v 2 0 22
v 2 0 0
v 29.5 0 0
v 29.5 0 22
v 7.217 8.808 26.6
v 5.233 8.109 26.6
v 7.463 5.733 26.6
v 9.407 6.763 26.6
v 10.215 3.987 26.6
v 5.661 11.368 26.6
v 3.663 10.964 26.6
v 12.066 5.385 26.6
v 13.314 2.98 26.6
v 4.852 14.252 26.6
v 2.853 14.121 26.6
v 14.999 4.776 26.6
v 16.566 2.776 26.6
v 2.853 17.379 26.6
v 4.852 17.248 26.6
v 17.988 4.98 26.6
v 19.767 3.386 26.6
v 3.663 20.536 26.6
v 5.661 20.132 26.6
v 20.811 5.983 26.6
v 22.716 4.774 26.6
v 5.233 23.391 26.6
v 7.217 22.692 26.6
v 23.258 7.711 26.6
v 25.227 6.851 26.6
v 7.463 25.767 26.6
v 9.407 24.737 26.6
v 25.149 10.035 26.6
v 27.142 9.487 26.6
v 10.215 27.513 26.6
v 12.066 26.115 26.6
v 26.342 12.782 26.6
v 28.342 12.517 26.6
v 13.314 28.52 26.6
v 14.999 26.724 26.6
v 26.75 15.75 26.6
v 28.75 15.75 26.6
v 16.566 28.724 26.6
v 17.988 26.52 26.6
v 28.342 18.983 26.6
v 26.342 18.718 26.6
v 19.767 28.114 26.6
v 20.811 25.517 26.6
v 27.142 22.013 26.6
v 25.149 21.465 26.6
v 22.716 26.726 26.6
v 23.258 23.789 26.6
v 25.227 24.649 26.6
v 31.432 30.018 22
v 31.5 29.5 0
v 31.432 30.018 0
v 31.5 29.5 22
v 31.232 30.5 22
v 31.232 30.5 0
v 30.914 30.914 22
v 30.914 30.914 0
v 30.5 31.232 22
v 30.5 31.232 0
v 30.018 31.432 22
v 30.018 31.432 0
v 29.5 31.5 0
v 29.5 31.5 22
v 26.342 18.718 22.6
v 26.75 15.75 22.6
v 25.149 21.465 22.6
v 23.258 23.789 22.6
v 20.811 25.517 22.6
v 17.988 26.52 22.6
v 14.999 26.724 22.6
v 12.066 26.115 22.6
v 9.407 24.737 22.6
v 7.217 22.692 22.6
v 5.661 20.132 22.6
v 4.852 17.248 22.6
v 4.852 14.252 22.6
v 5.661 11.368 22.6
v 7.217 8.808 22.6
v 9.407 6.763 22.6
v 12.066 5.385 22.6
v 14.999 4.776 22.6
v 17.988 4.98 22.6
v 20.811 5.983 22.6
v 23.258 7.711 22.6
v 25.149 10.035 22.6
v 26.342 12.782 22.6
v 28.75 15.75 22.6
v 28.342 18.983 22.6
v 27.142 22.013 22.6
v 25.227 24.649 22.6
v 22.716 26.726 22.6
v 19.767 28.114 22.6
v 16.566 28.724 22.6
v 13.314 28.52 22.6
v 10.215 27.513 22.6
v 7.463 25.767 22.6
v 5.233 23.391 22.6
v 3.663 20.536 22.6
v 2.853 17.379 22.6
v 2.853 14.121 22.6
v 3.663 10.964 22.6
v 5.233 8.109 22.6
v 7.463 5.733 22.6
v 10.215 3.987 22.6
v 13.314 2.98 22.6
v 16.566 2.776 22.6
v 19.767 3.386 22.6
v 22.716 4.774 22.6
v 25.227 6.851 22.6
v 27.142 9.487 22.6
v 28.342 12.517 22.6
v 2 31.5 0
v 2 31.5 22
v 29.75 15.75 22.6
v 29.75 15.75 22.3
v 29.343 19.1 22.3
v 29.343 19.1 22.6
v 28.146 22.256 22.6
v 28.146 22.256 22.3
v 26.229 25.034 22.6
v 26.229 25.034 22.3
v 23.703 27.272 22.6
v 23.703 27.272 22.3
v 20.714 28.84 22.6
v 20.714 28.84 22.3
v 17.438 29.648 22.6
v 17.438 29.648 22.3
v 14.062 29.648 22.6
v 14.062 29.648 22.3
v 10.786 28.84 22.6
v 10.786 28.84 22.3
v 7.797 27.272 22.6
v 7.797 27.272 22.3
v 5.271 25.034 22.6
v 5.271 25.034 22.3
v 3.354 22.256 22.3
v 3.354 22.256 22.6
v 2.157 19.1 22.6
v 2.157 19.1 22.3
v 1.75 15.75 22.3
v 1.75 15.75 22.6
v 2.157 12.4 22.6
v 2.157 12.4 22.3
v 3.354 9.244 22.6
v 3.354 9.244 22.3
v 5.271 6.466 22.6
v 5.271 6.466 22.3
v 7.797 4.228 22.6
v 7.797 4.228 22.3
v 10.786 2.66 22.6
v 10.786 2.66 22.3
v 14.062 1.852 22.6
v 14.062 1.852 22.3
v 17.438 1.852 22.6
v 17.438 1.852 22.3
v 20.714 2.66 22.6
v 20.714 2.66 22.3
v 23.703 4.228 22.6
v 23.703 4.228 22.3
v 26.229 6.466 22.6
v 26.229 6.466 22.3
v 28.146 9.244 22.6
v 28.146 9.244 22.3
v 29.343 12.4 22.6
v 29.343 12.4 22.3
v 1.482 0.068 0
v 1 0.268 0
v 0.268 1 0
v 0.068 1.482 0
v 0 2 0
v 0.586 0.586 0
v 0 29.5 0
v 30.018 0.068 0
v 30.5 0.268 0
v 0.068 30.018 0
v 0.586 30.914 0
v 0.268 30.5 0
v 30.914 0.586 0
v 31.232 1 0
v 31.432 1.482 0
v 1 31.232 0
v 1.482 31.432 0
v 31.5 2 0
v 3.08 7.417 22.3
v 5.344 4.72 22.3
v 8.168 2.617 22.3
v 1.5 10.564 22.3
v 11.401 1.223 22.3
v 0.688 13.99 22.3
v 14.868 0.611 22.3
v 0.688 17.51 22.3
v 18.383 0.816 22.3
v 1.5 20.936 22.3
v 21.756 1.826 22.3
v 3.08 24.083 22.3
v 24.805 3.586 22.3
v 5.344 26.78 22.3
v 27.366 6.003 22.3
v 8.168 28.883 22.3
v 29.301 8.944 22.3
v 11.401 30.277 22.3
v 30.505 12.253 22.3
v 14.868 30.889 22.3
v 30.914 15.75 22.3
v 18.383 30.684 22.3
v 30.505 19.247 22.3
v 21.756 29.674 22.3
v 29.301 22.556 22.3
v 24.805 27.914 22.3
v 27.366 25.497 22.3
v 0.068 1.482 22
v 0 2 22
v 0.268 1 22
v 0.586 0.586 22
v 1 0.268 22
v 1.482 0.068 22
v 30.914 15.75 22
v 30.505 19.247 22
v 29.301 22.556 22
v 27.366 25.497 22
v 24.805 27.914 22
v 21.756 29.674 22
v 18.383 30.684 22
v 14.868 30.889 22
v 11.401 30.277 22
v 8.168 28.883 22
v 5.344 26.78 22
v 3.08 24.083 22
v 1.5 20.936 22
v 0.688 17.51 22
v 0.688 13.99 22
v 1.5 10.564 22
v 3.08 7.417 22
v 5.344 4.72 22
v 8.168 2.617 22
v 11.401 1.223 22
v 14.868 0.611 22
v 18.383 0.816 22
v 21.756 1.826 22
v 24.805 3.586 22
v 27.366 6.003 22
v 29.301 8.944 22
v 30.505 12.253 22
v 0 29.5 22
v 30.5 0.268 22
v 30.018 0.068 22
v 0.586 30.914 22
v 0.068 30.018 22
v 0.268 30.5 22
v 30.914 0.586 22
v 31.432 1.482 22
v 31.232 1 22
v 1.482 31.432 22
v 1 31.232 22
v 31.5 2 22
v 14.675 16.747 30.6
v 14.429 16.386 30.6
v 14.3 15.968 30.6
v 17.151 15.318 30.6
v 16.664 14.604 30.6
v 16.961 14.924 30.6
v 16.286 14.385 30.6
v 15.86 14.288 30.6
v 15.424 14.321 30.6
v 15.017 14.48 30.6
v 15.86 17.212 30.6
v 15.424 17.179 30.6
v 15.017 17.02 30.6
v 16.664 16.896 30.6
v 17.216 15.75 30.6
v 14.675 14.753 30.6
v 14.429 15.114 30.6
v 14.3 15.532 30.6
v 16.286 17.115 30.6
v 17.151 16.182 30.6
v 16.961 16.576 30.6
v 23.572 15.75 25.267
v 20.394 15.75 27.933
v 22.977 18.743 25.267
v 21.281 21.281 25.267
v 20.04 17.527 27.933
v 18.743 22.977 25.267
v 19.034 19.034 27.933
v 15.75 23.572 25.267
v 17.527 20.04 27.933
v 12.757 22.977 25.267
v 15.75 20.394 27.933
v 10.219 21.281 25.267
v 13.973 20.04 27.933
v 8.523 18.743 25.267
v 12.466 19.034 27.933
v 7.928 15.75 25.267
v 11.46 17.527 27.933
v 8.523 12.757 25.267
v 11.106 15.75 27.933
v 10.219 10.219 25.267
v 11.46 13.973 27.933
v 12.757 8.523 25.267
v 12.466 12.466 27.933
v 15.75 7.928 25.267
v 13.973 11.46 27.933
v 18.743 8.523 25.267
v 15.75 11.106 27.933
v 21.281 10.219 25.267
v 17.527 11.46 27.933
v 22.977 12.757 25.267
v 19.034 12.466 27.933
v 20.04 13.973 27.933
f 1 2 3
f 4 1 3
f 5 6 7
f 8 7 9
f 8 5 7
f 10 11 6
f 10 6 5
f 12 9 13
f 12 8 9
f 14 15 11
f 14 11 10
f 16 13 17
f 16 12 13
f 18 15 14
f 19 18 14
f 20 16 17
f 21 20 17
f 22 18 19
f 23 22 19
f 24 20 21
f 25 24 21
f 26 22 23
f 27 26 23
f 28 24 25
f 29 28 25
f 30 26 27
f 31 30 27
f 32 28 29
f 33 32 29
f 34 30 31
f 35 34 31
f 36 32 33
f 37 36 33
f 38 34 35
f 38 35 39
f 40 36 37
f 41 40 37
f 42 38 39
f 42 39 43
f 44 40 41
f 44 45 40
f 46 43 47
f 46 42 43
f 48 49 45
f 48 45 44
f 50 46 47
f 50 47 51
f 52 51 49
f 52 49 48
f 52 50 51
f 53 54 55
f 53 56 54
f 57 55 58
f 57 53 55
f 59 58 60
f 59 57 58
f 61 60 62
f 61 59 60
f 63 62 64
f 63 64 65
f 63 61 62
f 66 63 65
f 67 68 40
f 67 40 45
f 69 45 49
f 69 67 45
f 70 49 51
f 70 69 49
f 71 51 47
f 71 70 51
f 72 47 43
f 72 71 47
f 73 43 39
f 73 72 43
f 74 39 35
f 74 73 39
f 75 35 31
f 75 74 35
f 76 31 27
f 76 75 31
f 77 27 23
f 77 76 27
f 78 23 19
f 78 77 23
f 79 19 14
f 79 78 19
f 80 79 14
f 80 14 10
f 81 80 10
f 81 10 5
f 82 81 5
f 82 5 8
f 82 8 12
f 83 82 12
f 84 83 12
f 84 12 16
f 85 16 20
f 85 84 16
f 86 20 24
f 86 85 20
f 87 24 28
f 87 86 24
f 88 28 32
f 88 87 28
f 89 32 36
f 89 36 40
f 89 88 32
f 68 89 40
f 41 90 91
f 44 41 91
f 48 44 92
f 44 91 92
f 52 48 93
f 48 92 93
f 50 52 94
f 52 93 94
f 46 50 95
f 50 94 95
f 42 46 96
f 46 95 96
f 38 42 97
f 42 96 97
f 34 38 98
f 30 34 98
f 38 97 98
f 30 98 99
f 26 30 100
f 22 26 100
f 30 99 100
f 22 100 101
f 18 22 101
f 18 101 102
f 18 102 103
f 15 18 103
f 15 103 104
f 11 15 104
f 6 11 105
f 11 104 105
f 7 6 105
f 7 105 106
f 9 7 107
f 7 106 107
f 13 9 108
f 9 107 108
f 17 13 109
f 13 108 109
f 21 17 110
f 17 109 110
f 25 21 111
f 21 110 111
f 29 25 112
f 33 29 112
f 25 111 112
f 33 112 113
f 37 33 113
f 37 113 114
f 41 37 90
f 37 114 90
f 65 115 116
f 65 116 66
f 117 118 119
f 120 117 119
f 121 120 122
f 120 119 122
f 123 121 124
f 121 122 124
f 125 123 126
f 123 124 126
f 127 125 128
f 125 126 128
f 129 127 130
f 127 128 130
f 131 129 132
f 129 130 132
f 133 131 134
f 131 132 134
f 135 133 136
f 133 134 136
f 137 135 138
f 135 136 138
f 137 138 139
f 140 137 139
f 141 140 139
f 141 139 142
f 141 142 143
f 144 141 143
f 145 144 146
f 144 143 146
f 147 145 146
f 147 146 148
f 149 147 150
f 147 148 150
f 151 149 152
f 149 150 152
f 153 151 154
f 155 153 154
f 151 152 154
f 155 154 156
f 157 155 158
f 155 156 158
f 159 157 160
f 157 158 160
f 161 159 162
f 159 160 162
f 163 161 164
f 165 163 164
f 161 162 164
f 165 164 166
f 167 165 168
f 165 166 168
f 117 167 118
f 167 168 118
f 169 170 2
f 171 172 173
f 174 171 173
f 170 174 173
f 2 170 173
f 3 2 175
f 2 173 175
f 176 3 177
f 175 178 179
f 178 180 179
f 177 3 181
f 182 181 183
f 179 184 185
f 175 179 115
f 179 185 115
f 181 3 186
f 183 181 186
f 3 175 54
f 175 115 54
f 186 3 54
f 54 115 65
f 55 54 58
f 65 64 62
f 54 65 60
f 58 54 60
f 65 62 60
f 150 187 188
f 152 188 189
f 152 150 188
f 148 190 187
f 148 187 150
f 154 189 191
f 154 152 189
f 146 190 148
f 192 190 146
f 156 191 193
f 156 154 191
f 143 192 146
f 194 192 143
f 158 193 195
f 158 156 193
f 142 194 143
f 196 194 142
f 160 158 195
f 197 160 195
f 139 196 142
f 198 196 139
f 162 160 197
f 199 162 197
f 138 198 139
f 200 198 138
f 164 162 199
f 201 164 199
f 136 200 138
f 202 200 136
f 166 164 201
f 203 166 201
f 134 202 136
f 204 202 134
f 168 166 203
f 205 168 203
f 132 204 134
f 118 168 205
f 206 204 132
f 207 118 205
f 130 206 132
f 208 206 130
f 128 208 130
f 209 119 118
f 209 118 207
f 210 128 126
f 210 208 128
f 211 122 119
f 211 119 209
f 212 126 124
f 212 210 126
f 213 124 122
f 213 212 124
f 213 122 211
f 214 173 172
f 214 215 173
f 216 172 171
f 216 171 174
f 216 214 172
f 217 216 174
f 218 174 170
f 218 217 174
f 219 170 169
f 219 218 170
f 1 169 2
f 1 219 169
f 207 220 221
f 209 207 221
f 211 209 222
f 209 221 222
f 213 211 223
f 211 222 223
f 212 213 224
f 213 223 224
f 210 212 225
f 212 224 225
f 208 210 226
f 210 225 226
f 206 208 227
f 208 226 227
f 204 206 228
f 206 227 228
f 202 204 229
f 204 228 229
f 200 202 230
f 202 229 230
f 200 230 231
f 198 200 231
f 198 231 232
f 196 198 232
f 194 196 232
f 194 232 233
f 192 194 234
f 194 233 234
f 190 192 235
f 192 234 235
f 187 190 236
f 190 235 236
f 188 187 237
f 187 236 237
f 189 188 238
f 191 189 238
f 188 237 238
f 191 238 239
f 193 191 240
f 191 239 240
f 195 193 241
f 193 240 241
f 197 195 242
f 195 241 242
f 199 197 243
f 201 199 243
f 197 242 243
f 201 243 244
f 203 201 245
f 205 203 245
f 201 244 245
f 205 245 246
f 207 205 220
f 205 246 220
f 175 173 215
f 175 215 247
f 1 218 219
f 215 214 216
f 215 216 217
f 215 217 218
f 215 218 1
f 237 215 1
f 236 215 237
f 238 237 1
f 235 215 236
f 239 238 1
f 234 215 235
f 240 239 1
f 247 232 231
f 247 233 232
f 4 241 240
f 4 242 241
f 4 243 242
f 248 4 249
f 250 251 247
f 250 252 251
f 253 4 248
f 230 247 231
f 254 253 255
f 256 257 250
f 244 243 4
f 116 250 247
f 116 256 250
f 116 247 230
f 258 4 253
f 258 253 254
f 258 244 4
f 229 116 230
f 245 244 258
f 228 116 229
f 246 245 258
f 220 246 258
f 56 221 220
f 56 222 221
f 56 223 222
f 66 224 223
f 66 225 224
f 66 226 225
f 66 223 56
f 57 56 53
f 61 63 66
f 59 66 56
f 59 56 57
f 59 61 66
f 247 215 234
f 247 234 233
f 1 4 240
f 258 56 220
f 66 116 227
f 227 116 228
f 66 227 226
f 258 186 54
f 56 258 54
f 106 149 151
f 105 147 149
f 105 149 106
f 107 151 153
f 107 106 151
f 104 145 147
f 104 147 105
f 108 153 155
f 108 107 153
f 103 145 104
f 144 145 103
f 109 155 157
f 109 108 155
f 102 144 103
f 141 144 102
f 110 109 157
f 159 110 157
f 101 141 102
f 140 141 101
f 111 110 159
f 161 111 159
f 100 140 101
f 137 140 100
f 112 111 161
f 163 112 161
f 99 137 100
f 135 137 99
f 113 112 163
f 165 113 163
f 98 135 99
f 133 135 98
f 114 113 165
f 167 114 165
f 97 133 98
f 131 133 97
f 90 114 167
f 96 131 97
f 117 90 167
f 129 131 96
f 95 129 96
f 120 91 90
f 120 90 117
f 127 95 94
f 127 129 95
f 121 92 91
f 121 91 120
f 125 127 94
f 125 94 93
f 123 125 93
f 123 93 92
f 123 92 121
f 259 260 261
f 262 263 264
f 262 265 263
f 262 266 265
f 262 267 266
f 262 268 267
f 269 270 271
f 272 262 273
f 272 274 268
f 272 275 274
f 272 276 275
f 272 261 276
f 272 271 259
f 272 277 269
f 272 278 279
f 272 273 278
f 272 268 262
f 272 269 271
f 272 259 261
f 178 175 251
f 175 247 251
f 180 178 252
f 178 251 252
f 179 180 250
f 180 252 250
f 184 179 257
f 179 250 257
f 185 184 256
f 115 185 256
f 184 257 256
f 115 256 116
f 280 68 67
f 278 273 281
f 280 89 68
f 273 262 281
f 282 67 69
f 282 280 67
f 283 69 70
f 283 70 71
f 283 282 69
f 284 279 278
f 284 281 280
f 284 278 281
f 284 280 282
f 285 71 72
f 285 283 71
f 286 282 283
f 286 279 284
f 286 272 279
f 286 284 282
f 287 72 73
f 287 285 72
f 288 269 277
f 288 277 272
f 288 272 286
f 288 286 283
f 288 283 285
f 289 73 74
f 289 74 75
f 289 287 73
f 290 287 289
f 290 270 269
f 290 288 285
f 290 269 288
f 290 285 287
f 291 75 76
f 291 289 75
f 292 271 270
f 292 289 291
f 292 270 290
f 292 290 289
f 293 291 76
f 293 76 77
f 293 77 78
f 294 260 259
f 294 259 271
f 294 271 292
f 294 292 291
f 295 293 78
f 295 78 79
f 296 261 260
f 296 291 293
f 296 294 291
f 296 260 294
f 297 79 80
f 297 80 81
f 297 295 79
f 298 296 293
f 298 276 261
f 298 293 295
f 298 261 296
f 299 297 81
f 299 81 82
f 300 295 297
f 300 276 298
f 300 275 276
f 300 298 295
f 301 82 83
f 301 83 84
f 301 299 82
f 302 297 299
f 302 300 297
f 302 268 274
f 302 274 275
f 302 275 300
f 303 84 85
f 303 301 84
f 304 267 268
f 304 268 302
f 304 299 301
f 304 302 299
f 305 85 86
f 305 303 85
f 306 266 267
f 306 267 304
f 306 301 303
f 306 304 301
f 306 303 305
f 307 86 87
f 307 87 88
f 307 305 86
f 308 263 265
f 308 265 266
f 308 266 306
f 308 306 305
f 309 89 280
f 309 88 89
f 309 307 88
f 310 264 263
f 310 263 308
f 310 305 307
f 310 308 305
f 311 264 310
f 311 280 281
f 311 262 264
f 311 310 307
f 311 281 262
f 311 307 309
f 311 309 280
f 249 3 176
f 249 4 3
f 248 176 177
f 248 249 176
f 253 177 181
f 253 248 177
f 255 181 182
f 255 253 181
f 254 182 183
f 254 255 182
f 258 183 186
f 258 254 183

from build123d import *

# Parameters (mm, degrees)
SKETCH1_W           = 31.5
SKETCH1_H           = 31.5
BOSS_EXTRUDE1_DEPTH = 22
FILLET2_R           = 2
SKETCH2_R           = 15.164213562
BOSS_EXTRUDE2_DEPTH = 0.3
SKETCH3_R           = 14
BOSS_EXTRUDE3_DEPTH = 0.3
SKETCH4_R           = 13
SKETCH4_R_2         = 11
BOSS_EXTRUDE5_DEPTH = 4
SKETCH6_R           = 11
BOSS_EXTRUDE6_DEPTH = 8
BOSS_EXTRUDE6_TAPER = 50


with BuildPart() as part:
    # Sketch1 → Boss-Extrude1 (new body)
    with BuildSketch(Plane.XY):
        with Locations((15.75, 15.75)):
            Rectangle(SKETCH1_W, SKETCH1_H)
    extrude(amount=BOSS_EXTRUDE1_DEPTH)

    # Fillet2
    fillet2_edges = [part.edges().sort_by_distance(p)[0] for p in [
        (0, 0, 11),
        (0, 31.5, 11),
        (31.5, 31.5, 11),
        (31.5, 0, 11),
    ]]
    fillet(fillet2_edges, radius=FILLET2_R)

    # Sketch2 → Boss-Extrude2 (add)
    with BuildSketch(Plane.XY.offset(22)):
        with Locations((15.75, 15.75)):
            Circle(SKETCH2_R)
    extrude(amount=BOSS_EXTRUDE2_DEPTH)

    # Sketch3 → Boss-Extrude3 (add)
    with BuildSketch(Plane.XY.offset(22.3)):
        with Locations((15.75, 15.75)):
            Circle(SKETCH3_R)
    extrude(amount=BOSS_EXTRUDE3_DEPTH)

    # Sketch4 → Boss-Extrude5 (add)
    with BuildSketch(Plane.XY.offset(22.6)):
        with Locations((15.75, 15.75)):
            Circle(SKETCH4_R)
        with Locations((15.75, 15.75)):
            Circle(SKETCH4_R_2, mode=Mode.SUBTRACT)
    extrude(amount=BOSS_EXTRUDE5_DEPTH)

    # Sketch6 → Boss-Extrude6 (add)
    with BuildSketch(Plane.XY.offset(22.6)):
        with Locations((15.75, 15.75)):
            Circle(SKETCH6_R)
    extrude(amount=BOSS_EXTRUDE6_DEPTH, taper=BOSS_EXTRUDE6_TAPER)


solid = part.part
